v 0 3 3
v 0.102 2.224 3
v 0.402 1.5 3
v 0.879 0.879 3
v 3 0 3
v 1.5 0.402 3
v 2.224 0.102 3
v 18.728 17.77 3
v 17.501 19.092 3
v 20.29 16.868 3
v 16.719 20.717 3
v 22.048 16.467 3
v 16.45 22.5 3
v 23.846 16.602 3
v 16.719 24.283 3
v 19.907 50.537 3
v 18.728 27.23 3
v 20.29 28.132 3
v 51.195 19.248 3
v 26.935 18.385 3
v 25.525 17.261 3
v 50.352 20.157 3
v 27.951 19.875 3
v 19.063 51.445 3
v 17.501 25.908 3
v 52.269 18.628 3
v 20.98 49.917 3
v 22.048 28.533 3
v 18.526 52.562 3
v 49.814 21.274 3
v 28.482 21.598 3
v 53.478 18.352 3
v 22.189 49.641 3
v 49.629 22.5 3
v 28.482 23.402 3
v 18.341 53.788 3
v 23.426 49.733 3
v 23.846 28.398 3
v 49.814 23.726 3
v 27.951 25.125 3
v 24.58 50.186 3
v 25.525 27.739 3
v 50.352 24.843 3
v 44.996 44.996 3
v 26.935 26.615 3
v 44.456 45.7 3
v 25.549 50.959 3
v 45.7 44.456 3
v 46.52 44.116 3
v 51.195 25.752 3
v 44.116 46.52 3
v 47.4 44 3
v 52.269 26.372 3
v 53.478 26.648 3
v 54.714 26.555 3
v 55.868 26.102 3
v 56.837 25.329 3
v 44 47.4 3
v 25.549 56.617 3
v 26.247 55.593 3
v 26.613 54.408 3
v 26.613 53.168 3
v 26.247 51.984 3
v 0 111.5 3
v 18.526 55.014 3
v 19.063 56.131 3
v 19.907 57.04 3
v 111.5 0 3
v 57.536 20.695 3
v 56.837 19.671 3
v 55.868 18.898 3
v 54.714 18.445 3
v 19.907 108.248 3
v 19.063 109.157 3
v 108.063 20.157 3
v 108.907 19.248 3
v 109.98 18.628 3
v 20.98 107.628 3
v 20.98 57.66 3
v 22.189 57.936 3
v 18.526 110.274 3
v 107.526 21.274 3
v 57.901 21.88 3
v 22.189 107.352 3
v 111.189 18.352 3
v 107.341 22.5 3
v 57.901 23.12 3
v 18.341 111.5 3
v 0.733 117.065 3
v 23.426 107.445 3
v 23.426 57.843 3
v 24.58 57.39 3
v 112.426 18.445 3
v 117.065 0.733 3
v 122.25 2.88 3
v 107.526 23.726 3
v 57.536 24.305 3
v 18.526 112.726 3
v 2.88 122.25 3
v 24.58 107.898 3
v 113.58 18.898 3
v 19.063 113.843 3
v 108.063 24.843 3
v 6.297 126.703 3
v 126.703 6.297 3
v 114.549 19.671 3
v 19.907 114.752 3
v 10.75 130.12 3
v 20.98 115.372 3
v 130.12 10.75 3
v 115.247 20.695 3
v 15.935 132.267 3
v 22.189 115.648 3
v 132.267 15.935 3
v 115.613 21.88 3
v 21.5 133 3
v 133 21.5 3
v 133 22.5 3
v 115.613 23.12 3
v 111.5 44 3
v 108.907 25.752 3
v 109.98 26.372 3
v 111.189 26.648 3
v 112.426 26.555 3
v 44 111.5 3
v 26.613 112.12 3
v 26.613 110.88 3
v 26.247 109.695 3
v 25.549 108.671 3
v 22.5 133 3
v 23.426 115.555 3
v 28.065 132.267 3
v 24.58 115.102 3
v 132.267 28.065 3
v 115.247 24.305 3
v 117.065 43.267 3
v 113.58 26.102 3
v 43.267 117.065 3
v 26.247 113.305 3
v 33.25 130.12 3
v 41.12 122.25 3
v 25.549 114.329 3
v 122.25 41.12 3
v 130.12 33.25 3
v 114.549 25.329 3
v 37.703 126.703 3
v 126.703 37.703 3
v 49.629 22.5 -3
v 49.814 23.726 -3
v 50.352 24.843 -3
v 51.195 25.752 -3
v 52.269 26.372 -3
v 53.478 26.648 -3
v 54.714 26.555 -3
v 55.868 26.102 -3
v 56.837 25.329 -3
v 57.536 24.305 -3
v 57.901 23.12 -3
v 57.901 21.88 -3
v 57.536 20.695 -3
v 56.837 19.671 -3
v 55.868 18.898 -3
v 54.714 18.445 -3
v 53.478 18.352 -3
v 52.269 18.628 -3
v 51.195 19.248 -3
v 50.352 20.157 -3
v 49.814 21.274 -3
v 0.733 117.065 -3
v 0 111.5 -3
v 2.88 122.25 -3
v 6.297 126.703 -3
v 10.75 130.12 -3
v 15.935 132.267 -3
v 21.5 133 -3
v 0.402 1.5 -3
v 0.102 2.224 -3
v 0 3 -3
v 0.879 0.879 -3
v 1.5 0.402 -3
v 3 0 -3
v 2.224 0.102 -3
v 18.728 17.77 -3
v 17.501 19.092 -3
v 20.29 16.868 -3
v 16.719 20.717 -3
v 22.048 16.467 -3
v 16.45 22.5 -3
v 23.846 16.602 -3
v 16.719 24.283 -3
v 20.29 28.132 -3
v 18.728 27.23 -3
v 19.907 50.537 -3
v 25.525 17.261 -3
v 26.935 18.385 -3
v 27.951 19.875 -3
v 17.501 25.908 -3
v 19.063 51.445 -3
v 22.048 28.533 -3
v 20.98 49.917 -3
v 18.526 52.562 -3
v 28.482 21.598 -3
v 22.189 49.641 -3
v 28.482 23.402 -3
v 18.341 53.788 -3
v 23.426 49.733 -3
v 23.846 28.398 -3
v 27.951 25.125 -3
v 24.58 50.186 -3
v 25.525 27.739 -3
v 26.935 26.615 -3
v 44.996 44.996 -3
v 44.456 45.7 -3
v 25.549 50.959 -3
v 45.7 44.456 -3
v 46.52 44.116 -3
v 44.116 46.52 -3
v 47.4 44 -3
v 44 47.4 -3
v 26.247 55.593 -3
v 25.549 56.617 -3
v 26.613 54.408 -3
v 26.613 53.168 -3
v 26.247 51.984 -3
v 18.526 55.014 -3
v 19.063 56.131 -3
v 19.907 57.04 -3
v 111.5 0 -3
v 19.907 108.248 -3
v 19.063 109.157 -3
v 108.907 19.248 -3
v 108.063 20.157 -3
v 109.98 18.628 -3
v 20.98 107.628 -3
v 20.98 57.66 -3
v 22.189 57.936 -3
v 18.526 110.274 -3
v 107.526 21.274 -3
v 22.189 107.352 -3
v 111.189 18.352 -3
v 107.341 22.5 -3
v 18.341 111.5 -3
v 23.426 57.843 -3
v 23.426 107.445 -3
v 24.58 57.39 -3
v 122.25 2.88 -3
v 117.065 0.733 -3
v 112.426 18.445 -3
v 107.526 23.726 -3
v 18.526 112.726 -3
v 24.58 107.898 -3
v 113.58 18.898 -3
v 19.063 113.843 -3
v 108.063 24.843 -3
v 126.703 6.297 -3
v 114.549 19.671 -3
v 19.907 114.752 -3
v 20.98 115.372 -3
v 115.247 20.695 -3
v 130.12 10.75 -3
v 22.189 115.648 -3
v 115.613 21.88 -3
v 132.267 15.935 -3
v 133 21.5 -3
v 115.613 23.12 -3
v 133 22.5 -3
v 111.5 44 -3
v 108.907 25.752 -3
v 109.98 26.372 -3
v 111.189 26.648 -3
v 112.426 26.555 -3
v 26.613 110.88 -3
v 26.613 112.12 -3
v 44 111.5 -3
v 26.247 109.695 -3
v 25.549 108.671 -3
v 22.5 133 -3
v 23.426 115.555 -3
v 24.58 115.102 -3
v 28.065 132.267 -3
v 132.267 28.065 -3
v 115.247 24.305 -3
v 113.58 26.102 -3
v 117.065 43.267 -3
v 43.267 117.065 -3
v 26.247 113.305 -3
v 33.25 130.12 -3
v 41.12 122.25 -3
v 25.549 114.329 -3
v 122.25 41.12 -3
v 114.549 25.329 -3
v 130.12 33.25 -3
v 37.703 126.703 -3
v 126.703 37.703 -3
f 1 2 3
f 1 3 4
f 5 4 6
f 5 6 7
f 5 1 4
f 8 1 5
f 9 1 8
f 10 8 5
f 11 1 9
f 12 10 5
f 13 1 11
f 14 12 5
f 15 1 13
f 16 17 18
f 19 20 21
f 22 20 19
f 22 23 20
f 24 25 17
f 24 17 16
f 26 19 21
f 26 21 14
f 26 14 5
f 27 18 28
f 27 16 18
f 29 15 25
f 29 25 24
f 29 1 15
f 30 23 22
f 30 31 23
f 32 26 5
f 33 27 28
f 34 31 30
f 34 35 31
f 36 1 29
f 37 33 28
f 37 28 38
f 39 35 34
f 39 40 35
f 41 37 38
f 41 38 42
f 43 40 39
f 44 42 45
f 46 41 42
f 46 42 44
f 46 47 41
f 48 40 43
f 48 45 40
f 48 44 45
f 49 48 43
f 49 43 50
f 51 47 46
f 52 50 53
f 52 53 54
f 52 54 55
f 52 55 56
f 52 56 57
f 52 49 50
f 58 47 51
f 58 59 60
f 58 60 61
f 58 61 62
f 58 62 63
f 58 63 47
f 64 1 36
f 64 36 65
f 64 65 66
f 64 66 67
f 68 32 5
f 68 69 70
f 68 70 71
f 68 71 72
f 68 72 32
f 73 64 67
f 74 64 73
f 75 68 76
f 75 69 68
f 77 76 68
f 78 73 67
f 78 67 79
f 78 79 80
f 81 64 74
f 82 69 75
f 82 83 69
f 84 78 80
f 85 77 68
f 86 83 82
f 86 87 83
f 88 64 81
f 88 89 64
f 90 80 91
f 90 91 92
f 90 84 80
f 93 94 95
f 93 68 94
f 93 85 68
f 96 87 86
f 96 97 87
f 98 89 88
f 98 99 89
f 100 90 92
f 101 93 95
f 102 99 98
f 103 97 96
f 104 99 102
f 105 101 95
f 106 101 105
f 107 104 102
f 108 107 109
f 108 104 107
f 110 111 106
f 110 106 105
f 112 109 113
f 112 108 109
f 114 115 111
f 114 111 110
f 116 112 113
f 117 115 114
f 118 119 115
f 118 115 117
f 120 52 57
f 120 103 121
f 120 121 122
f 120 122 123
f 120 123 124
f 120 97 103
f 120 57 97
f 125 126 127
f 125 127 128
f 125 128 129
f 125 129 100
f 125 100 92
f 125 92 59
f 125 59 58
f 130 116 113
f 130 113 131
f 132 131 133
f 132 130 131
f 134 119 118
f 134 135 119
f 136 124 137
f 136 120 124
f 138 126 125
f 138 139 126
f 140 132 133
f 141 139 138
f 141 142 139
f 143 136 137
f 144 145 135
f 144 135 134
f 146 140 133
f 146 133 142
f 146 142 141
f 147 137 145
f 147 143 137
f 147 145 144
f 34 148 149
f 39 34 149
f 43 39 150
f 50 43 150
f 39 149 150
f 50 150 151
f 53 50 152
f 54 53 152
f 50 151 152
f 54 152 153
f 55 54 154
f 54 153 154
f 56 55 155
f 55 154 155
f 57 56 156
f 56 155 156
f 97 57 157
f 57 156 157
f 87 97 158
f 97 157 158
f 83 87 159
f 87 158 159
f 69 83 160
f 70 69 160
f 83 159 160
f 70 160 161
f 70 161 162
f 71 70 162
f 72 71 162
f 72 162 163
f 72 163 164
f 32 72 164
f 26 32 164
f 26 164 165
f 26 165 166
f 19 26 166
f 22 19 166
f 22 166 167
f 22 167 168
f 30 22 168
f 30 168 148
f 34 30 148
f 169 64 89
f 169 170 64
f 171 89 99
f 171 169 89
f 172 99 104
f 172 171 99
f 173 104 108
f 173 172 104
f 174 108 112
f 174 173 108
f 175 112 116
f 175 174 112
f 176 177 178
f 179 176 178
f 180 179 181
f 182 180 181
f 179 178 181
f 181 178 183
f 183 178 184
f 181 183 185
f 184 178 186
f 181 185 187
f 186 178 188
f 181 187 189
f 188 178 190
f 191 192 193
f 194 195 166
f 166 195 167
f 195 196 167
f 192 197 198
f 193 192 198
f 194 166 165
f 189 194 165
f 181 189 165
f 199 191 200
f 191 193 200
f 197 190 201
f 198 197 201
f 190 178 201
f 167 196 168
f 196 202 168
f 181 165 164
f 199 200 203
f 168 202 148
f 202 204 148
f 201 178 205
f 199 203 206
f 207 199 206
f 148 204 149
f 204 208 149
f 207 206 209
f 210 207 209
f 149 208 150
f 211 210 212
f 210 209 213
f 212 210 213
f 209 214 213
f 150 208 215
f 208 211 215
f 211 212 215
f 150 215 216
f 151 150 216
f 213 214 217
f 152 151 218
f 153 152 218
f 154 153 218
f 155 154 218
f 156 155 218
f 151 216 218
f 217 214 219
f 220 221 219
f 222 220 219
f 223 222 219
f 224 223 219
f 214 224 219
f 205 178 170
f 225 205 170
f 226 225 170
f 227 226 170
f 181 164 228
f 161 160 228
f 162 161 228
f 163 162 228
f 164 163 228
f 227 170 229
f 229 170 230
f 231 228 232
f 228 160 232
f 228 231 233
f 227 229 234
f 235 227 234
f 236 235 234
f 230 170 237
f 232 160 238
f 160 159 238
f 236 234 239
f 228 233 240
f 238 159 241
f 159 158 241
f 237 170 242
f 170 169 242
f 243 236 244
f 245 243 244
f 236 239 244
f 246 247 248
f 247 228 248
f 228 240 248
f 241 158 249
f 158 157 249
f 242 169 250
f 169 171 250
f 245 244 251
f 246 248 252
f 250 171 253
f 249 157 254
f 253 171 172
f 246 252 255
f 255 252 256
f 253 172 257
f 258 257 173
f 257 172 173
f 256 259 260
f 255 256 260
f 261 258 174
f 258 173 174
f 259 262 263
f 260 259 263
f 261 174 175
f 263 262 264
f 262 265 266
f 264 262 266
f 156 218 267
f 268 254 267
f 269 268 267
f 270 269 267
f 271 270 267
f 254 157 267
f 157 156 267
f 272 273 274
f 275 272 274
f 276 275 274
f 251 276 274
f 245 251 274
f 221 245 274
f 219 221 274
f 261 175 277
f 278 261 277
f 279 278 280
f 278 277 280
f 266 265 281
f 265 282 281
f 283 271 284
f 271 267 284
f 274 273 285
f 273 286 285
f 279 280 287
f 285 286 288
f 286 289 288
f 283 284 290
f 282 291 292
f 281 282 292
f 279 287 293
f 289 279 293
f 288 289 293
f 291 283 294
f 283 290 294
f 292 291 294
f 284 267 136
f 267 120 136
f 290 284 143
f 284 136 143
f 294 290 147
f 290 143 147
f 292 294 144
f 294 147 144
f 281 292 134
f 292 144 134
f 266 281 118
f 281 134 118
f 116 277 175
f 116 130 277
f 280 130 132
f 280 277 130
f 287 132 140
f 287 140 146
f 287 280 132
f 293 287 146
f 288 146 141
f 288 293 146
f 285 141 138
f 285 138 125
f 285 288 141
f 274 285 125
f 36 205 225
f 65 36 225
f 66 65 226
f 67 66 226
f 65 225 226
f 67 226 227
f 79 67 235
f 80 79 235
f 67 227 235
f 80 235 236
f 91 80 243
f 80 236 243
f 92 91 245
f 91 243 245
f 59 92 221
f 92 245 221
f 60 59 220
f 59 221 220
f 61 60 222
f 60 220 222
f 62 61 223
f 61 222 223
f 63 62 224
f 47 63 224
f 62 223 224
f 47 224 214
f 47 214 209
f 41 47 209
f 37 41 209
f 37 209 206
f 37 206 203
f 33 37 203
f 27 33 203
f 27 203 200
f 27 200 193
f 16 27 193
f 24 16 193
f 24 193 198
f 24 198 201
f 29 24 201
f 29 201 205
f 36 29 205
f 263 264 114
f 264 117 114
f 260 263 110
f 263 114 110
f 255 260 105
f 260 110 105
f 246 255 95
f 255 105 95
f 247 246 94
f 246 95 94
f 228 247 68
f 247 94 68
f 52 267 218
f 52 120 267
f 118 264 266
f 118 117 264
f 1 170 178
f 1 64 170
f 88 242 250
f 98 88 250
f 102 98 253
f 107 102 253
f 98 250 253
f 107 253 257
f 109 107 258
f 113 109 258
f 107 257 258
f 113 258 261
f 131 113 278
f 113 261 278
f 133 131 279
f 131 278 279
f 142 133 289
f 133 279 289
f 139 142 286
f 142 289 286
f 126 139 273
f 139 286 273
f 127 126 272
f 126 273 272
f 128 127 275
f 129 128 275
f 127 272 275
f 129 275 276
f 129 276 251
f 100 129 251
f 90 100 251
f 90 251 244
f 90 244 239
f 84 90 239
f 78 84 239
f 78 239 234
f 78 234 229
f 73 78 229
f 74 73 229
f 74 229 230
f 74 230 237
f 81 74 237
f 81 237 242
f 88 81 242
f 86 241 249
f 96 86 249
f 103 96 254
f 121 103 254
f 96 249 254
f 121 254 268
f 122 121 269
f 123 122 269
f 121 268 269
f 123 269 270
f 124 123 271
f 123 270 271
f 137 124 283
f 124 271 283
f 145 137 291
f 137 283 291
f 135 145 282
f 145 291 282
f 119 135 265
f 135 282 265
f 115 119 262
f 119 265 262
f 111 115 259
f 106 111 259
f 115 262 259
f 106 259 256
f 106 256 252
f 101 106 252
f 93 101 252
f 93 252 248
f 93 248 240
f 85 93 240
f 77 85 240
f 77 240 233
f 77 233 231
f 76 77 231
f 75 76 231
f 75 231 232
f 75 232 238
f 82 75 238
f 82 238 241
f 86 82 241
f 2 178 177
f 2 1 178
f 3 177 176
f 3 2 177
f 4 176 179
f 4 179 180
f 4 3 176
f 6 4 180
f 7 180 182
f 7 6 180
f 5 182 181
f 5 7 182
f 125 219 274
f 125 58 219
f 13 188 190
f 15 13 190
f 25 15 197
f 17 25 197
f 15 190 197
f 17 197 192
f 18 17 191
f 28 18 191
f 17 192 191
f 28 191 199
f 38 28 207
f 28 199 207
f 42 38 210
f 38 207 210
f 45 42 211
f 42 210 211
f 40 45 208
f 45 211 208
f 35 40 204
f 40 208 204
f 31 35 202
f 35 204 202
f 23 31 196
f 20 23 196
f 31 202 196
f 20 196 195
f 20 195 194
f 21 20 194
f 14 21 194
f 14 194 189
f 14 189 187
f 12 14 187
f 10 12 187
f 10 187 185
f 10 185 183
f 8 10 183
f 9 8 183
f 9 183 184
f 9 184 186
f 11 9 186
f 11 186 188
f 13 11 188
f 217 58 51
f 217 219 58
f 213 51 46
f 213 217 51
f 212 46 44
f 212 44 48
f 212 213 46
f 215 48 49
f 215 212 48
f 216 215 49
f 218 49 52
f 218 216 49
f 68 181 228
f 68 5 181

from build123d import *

# Parameters (mm, degrees)
BOSS_EXTRUDE1_DEPTH      = 3
FILLET4_R                = 21.5
FILLET5_R                = 3.4
FILLET6_R                = 3
F_5_16_CLEARANCE_HOLE1_D = 8.3185
M12_CLEARANCE_HOLE1_D    = 12.1


with BuildPart() as part:
    # Sketch1 → Boss-Extrude1 (new, symmetric)
    with BuildSketch(Plane.XY):
        Polygon((0, 133), (0, 0), (133, 0), (133, 44), (44, 44), (44, 133), align=None)
    extrude(amount=BOSS_EXTRUDE1_DEPTH, both=True)

    # Fillet4
    fillet4_edges = [part.edges().sort_by_distance(p)[0] for p in [
        (133, 44, 0),
        (133, 0, 0),
        (0, 133, 0),
        (44, 133, 0),
    ]]
    fillet(fillet4_edges, radius=FILLET4_R)

    # Fillet5
    fillet5_edges = [part.edges().sort_by_distance(p)[0] for p in [
        (44, 44, 0),
    ]]
    fillet(fillet5_edges, radius=FILLET5_R)

    # Fillet6
    fillet6_edges = [part.edges().sort_by_distance(p)[0] for p in [
        (0, 0, 0),
    ]]
    fillet(fillet6_edges, radius=FILLET6_R)

    # 5/16 Clearance Hole1 (through all)
    with Locations(Plane.XY.offset(3)):
        with Locations((22.5, 111.5), (22.5, 53.7884), (53.7884, 22.5), (111.5, 22.5)):
            Hole(F_5_16_CLEARANCE_HOLE1_D / 2)

    # M12 Clearance Hole1 (through all)
    with Locations(Plane.XY.offset(3)):
        with Locations((22.5, 22.5)):
            Hole(M12_CLEARANCE_HOLE1_D / 2)


solid = part.part
